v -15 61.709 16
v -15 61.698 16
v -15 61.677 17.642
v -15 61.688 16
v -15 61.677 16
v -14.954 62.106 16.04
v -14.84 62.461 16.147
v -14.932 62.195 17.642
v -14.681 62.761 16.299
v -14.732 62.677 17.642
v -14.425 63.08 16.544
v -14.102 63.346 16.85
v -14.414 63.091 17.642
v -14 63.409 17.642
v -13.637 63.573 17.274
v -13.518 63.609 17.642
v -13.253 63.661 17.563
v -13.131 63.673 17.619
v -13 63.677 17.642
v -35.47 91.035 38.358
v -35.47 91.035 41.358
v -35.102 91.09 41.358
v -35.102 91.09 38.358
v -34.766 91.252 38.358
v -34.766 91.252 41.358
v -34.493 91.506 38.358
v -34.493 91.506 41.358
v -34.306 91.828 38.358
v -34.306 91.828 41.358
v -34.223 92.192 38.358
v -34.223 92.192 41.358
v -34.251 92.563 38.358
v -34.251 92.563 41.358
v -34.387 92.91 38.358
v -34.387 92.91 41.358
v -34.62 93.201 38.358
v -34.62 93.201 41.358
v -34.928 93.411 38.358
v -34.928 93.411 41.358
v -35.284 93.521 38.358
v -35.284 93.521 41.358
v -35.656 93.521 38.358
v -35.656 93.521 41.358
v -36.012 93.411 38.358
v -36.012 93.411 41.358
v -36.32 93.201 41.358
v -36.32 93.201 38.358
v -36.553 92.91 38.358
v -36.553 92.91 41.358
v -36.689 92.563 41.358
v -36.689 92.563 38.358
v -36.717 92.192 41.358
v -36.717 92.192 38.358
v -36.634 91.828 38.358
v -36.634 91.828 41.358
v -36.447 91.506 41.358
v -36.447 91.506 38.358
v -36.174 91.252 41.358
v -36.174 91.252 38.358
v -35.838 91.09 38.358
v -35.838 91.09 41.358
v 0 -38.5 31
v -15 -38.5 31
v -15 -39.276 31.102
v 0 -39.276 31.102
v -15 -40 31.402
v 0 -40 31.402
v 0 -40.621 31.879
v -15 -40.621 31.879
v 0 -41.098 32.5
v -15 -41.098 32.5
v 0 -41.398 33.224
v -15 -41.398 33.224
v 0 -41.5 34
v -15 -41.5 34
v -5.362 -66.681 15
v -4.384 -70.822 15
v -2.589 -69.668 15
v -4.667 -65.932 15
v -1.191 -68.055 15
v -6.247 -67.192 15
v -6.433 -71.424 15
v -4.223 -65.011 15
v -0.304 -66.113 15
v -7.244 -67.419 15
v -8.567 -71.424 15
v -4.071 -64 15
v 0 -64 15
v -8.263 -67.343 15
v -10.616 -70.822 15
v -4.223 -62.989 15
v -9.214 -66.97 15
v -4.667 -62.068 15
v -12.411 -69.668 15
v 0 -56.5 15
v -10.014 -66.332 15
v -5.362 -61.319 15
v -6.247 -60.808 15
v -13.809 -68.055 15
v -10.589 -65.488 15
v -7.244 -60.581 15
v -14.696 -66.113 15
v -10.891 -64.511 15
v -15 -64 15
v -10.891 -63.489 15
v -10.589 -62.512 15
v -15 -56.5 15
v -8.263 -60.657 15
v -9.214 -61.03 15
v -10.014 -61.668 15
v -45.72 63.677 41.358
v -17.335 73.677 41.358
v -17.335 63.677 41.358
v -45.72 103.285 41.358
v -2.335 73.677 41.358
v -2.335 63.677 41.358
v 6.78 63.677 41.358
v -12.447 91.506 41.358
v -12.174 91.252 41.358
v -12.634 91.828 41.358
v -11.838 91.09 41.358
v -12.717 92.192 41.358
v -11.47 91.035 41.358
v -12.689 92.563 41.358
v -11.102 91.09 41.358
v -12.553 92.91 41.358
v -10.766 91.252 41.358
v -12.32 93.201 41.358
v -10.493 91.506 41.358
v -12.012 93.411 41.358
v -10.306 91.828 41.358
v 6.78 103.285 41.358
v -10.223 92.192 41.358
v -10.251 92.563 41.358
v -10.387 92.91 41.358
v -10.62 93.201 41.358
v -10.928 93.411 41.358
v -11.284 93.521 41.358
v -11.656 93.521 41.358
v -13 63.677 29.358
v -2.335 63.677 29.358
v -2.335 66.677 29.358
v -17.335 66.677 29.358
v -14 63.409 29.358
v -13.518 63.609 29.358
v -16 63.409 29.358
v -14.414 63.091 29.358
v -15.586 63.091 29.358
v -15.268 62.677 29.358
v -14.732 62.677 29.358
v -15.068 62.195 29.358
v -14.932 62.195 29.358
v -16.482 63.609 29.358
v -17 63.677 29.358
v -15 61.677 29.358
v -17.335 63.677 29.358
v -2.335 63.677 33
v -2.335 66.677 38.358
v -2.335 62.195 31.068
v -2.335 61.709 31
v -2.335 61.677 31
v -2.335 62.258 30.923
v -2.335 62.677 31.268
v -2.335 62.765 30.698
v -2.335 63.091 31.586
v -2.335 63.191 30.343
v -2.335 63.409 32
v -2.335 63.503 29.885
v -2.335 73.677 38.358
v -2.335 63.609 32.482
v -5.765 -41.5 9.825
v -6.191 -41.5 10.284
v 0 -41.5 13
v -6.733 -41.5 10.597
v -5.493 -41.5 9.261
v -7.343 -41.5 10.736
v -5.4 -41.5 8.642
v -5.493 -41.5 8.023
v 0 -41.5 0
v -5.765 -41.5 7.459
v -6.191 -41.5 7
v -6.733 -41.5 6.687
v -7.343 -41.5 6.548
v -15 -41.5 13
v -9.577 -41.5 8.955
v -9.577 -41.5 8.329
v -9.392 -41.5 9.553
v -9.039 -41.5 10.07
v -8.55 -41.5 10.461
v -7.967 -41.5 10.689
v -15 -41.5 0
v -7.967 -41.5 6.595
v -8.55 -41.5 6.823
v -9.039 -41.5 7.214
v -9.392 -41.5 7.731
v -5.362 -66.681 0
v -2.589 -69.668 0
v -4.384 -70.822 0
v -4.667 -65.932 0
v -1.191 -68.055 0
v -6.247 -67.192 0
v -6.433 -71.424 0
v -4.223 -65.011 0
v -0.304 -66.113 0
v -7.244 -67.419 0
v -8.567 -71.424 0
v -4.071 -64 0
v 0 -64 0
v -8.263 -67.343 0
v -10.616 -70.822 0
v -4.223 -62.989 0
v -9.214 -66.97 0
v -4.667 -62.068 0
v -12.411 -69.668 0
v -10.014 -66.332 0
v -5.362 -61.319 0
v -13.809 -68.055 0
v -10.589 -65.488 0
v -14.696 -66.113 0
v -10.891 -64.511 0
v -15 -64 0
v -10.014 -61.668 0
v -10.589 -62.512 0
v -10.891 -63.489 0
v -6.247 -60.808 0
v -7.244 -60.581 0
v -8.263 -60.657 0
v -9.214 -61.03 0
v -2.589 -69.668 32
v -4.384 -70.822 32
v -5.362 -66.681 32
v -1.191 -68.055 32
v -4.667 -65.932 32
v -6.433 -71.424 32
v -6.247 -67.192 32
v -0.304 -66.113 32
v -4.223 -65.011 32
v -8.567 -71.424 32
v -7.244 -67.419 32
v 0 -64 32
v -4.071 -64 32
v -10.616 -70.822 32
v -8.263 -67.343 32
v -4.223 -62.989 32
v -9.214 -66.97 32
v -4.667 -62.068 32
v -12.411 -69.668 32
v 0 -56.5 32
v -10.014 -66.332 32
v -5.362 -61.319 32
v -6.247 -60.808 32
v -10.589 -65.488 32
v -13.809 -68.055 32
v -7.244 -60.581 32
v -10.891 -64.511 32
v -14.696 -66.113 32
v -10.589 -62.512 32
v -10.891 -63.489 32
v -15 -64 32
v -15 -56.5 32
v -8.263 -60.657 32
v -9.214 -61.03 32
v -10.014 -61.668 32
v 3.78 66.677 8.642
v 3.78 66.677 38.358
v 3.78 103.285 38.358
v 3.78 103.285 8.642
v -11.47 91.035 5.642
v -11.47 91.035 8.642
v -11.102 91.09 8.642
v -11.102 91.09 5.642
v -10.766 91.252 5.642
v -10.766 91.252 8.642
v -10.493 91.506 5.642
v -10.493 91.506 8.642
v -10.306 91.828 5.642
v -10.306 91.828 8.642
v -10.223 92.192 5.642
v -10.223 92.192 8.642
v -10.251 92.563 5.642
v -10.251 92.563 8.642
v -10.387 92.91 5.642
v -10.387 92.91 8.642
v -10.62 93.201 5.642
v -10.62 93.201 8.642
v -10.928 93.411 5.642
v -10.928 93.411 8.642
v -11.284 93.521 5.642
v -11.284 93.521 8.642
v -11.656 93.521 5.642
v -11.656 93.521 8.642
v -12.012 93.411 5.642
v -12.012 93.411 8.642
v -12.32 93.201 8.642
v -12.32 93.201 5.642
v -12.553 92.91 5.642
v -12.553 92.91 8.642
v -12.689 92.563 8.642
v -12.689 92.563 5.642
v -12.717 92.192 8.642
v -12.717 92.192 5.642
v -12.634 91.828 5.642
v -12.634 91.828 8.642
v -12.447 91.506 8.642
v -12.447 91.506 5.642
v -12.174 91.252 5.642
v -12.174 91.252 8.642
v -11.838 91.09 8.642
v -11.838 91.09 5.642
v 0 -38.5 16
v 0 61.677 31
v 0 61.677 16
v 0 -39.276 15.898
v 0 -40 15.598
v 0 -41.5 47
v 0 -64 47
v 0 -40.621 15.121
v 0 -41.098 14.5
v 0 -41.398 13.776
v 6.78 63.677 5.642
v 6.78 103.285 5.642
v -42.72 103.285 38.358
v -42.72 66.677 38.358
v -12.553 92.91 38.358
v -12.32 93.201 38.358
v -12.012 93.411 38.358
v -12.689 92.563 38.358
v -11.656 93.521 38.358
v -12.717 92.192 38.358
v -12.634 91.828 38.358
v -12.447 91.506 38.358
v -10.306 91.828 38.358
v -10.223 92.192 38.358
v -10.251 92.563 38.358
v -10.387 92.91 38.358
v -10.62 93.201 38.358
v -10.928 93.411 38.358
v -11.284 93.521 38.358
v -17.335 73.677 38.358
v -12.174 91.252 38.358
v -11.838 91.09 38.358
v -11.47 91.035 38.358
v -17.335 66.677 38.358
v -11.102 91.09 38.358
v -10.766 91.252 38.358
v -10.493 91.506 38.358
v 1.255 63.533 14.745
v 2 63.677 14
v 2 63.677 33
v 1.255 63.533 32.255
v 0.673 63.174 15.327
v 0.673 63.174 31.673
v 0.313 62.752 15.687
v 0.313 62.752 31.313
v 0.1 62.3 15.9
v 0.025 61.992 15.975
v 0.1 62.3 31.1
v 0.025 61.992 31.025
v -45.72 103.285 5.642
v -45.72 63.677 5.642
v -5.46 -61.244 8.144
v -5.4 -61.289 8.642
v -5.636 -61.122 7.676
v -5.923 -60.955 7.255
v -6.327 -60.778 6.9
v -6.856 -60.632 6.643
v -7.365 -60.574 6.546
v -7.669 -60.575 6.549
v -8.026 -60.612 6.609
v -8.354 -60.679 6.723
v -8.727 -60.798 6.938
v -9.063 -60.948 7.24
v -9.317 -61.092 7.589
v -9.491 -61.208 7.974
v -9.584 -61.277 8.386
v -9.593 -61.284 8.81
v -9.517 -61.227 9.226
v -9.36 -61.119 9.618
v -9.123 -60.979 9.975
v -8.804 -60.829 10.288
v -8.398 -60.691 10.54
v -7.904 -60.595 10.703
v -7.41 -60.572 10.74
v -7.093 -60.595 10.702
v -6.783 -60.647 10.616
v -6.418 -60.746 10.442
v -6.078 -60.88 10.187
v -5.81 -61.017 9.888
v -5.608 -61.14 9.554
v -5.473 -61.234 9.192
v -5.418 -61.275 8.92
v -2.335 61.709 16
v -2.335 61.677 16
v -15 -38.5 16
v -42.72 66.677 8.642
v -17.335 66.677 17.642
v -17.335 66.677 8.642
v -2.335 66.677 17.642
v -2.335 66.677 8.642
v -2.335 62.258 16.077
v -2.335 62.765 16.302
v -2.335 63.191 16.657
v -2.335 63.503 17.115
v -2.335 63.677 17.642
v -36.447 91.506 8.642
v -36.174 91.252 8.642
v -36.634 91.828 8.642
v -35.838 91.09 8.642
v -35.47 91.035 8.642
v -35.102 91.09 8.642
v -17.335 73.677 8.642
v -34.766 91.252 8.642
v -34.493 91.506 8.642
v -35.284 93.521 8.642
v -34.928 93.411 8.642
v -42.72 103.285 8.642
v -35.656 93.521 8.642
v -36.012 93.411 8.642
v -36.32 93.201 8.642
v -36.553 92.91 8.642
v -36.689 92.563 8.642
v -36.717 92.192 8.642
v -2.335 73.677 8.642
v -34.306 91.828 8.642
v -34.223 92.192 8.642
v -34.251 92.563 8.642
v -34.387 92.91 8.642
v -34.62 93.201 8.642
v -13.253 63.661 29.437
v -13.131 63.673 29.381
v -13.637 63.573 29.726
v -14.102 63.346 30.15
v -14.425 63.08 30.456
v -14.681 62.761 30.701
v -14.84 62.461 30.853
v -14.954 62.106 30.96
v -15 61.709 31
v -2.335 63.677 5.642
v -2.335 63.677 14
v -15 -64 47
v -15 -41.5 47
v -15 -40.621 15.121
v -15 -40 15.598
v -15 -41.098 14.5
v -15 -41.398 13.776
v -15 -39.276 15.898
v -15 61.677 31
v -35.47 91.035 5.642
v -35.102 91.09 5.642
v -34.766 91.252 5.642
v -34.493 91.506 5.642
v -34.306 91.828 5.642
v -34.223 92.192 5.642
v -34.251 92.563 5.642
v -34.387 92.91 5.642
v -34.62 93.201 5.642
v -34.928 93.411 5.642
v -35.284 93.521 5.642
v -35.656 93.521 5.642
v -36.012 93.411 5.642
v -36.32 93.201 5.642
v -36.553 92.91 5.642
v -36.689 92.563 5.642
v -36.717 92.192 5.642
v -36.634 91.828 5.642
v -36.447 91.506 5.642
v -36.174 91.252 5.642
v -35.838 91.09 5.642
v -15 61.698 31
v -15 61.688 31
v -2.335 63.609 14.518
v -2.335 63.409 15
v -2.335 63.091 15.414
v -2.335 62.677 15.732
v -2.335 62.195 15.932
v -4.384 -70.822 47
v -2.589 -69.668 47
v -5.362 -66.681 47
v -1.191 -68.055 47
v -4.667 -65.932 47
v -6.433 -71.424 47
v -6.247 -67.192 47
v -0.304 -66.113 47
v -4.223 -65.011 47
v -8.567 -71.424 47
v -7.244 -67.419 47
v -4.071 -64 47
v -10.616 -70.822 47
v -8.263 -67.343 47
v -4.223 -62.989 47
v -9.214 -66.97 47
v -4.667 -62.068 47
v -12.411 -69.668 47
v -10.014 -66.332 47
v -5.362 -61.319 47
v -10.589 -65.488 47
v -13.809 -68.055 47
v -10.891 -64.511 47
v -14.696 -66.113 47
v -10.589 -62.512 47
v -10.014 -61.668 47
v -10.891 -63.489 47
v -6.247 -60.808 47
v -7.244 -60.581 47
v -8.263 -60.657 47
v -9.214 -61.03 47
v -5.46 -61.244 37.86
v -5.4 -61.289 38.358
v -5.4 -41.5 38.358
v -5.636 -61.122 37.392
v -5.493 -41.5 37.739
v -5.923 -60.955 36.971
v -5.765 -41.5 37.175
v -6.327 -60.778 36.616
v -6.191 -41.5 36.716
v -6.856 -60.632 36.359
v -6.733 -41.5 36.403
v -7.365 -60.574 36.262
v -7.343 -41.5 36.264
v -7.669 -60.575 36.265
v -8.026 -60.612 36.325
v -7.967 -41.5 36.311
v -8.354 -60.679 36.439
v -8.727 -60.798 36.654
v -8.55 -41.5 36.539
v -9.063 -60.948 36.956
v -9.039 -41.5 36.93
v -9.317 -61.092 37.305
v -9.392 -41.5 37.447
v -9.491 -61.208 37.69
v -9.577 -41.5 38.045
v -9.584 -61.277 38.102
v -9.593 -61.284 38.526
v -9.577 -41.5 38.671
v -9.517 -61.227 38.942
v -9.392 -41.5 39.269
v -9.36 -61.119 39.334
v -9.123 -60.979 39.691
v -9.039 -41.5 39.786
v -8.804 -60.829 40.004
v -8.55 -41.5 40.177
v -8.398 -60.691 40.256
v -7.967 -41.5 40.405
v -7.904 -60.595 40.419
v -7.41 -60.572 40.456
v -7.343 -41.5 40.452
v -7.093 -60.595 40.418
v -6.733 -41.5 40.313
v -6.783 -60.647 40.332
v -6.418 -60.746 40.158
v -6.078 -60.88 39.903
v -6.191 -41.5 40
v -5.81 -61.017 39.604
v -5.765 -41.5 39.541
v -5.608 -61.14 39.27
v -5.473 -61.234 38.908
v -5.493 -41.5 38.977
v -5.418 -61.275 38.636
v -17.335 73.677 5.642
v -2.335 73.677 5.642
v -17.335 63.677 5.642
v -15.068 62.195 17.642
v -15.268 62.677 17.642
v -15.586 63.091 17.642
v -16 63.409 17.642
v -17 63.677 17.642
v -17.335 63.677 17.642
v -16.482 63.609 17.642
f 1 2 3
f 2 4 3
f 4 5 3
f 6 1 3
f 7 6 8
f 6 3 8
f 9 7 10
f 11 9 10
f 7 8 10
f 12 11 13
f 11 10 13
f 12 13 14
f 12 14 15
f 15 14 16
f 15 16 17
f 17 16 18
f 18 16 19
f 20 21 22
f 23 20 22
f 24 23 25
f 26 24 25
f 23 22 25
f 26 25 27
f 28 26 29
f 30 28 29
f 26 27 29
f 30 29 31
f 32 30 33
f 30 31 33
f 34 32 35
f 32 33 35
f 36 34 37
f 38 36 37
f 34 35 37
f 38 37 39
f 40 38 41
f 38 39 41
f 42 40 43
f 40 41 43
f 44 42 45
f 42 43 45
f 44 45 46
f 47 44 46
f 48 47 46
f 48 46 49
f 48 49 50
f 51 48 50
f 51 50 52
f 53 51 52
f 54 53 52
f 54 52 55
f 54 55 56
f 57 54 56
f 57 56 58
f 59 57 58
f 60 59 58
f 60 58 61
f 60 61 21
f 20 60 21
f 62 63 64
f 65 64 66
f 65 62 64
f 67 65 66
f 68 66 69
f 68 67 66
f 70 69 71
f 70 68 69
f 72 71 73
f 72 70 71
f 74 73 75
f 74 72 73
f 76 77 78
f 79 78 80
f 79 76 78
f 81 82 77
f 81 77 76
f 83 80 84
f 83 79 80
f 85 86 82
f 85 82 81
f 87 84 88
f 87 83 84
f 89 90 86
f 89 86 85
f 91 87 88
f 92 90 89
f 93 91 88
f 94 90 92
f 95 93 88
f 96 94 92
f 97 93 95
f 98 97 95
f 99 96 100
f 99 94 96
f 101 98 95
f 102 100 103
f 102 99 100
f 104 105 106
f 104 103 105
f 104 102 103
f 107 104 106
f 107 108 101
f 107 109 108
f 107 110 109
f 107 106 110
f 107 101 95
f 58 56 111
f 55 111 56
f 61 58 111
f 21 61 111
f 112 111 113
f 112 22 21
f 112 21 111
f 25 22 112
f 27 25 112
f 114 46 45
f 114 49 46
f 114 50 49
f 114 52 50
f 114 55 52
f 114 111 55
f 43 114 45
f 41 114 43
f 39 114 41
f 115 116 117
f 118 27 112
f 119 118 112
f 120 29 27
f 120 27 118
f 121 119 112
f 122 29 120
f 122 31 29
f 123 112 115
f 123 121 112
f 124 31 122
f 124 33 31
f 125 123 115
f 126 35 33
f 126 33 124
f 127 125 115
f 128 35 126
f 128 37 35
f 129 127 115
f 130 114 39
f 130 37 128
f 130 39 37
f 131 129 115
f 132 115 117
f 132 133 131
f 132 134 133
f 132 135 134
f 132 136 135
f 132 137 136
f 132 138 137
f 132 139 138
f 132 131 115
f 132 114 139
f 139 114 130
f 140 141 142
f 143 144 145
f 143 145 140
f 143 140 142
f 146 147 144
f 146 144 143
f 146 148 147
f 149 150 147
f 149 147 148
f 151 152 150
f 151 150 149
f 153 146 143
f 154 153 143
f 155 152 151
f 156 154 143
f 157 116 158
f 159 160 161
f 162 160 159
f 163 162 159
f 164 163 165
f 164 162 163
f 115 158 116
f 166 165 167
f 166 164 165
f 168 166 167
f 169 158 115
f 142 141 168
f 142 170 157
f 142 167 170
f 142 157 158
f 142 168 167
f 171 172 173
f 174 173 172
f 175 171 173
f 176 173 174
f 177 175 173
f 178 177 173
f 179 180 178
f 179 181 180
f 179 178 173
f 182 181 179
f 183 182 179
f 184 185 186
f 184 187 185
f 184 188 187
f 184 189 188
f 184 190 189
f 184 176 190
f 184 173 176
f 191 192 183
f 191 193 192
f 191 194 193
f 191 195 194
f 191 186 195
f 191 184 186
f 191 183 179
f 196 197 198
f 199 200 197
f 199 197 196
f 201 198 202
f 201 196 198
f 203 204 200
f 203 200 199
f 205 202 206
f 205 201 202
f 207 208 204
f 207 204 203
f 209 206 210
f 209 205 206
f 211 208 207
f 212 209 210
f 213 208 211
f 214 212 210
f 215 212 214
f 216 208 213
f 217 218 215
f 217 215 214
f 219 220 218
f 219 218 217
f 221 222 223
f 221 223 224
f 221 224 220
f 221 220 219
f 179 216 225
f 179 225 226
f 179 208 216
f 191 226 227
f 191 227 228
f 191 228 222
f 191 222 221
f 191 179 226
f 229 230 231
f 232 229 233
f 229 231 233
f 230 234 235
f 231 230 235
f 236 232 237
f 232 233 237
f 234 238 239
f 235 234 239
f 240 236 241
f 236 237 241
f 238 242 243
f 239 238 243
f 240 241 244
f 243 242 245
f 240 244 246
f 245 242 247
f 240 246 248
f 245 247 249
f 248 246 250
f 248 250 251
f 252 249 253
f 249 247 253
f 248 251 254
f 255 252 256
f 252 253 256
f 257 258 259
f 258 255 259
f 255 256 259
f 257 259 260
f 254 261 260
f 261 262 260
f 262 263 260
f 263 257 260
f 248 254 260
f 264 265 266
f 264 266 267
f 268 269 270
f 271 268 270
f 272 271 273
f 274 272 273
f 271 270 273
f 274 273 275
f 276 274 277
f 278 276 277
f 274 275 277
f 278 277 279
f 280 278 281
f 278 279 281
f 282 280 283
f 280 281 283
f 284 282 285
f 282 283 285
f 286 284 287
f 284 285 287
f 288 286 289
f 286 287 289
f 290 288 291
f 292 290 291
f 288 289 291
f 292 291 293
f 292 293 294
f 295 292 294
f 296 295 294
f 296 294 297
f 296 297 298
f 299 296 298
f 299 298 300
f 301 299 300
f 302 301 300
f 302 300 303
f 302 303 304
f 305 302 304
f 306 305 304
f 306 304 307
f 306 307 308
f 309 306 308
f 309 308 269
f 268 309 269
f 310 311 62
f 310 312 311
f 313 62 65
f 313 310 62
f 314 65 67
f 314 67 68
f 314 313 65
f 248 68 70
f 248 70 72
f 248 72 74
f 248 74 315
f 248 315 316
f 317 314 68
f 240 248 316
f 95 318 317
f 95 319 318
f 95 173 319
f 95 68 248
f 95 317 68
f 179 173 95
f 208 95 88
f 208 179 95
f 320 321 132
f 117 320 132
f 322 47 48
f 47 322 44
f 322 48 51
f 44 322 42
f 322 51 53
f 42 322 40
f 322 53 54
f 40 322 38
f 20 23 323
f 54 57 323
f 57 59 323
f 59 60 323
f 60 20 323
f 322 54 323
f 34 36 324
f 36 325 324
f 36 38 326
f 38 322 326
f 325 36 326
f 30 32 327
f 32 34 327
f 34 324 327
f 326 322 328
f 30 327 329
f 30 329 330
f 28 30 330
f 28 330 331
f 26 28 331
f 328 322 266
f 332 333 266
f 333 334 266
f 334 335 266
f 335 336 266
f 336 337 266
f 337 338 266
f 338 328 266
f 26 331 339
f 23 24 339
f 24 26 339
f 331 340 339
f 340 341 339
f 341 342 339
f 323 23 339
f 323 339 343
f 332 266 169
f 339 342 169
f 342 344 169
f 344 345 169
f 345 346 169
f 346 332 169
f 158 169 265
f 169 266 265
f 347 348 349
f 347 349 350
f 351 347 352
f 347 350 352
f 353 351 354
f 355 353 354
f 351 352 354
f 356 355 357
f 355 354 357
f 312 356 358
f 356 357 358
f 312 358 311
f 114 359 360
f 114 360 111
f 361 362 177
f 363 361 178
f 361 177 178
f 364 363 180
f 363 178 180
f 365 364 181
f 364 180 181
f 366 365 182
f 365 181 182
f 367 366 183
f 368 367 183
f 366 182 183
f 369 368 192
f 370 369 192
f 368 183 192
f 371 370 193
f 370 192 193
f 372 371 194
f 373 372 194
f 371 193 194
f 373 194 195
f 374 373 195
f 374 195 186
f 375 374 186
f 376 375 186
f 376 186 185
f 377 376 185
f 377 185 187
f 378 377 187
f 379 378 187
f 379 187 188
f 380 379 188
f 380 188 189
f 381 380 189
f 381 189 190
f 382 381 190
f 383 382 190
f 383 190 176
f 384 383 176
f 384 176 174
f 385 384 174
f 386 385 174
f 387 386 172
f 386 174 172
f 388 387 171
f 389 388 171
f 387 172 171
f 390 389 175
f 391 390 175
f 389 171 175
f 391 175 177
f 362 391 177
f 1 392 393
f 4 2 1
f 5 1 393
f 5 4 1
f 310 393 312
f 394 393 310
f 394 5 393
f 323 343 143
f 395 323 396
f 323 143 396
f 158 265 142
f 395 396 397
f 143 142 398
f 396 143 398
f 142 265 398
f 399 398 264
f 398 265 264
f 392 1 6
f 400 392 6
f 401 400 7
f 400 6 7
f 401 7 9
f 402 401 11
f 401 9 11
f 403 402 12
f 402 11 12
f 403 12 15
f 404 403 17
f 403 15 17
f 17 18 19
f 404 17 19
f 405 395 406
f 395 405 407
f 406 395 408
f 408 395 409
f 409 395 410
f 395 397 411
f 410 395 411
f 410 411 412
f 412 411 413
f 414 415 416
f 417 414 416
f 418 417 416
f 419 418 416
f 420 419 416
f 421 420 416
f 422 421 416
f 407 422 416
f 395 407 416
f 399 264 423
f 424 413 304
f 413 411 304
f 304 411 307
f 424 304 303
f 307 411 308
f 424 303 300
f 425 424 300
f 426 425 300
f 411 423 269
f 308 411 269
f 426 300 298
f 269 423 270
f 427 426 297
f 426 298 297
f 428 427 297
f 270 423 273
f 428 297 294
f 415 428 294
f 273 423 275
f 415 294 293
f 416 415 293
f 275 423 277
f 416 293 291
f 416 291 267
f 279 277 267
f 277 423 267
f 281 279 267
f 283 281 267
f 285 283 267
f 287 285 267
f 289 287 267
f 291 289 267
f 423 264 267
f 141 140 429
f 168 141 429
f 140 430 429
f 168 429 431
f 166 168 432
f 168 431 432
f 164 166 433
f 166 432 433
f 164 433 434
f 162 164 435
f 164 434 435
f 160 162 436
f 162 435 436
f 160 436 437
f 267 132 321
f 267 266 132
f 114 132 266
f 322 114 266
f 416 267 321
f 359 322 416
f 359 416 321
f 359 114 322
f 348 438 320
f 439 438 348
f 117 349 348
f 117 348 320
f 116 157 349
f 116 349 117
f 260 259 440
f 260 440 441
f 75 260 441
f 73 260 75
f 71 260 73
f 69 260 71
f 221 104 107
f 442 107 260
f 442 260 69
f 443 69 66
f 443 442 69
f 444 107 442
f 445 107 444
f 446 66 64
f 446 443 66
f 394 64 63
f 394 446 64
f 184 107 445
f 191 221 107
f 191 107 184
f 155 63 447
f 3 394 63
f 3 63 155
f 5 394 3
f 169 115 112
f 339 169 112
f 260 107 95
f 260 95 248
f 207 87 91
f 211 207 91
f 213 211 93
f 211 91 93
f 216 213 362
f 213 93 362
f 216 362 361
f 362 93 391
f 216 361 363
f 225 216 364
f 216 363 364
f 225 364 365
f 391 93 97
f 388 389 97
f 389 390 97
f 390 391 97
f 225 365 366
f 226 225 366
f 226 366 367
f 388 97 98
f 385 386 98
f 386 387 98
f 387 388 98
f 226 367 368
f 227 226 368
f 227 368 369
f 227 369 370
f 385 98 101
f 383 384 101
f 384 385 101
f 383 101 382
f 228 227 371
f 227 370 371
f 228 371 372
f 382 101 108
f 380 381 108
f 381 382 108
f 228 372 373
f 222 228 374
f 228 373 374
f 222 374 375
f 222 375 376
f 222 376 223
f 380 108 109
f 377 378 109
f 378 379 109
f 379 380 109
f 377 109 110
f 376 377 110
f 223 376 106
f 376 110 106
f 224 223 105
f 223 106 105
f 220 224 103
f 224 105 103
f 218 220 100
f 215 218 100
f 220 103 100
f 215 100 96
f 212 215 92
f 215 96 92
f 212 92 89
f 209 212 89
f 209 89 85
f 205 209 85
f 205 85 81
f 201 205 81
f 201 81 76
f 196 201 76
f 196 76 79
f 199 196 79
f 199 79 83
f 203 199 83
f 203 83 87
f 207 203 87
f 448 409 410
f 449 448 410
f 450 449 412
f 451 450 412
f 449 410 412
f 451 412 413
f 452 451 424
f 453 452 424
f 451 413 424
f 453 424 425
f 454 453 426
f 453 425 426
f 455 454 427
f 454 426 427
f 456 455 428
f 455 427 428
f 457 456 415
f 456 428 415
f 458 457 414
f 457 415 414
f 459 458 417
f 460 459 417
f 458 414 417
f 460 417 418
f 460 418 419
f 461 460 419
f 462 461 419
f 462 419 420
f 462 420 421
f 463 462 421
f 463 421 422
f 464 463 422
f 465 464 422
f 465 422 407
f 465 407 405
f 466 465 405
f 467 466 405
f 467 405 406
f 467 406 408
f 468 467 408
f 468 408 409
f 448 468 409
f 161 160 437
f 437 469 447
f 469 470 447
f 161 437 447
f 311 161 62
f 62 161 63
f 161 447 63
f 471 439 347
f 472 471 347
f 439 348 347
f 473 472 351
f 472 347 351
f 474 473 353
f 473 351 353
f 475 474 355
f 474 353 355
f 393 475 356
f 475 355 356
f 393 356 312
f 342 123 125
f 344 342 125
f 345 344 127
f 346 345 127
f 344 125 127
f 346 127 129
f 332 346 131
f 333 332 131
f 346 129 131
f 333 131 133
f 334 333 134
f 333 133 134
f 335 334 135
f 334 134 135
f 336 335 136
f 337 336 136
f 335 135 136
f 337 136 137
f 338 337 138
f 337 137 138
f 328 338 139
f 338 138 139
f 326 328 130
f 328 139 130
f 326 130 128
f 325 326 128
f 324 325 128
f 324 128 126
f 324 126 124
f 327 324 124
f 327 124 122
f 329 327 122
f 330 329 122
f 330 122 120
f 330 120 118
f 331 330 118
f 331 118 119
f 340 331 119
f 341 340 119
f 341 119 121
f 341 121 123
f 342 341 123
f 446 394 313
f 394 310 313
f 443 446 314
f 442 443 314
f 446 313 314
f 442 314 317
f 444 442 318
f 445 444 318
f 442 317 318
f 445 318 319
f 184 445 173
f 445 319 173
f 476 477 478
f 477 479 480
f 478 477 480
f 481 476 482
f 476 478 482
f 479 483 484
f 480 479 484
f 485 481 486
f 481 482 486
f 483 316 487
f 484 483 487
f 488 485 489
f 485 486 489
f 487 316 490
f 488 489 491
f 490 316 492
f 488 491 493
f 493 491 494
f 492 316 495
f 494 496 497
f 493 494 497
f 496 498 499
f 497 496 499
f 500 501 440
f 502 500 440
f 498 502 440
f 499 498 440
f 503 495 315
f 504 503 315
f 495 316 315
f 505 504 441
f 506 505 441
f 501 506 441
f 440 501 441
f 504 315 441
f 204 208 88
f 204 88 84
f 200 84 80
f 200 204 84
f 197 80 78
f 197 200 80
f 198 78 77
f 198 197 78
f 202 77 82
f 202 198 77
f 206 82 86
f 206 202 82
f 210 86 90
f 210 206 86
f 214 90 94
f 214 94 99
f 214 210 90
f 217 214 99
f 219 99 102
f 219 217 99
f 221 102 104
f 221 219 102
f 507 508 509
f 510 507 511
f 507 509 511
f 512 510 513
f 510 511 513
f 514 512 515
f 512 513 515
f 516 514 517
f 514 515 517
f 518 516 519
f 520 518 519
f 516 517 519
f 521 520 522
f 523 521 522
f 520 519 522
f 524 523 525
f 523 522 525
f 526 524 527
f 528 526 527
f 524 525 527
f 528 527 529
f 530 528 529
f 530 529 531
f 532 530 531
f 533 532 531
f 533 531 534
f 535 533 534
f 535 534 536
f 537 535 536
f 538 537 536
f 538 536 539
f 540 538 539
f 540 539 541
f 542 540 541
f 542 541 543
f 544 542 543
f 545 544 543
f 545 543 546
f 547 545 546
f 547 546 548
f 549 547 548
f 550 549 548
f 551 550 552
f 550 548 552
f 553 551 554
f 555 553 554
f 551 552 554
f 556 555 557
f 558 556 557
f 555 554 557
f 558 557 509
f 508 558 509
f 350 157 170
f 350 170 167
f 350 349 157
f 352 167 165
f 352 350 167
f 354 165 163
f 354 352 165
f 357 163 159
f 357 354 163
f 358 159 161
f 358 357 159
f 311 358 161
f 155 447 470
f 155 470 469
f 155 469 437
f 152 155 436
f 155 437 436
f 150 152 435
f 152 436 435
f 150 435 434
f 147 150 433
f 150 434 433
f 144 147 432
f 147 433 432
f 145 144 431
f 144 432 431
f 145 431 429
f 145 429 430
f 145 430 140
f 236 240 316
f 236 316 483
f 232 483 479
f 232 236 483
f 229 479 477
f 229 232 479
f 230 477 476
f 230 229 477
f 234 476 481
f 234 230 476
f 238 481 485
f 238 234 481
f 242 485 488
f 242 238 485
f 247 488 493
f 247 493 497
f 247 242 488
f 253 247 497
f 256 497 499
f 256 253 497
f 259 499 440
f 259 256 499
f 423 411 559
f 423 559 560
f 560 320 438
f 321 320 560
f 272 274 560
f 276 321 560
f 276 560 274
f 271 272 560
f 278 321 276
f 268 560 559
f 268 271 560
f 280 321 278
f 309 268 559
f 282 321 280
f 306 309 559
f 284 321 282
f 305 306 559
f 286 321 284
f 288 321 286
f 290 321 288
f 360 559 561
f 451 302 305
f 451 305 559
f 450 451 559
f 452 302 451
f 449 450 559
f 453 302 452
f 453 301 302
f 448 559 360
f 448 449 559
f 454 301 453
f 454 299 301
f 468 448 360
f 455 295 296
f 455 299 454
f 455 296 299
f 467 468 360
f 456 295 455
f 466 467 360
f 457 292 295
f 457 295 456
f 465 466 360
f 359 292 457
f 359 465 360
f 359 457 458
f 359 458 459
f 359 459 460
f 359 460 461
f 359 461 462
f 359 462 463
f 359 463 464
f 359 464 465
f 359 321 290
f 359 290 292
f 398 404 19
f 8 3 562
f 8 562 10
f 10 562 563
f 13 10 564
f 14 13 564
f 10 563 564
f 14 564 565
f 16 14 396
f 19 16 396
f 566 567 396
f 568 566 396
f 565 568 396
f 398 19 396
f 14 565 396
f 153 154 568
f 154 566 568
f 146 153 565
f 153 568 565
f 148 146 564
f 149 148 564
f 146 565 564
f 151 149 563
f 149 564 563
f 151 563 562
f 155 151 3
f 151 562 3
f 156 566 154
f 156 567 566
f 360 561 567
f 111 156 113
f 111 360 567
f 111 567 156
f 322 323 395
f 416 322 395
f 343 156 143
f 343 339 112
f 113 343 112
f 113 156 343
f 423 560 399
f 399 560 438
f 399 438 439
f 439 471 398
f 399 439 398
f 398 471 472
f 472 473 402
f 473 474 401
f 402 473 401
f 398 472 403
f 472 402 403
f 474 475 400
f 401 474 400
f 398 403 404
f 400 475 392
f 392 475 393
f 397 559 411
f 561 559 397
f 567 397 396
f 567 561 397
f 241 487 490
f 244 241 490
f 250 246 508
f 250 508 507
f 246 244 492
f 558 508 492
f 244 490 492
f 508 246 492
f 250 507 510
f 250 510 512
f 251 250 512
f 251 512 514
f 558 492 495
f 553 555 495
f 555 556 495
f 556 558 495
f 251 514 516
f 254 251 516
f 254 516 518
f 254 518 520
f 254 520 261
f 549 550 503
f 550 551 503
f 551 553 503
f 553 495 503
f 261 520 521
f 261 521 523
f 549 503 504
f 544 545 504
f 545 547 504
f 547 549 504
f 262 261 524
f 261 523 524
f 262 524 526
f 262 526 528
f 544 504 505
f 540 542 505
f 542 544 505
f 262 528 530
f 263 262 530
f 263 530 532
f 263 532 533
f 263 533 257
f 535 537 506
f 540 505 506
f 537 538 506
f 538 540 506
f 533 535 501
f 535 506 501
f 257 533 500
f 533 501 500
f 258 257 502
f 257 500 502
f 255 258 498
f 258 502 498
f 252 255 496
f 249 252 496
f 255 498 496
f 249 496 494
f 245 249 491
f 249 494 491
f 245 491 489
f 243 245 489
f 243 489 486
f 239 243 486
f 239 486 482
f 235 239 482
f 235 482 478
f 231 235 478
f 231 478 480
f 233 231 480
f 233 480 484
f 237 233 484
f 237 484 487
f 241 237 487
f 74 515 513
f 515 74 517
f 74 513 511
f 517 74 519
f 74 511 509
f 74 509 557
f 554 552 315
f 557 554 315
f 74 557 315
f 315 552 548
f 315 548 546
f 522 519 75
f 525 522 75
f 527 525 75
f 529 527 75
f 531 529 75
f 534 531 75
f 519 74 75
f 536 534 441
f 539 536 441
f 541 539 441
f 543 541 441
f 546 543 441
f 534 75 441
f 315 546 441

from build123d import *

# Parameters (mm, degrees)
BOSS_EXTRU_1_DEPTH                            = 47
ESQUISSE2_W                                   = 17
ESQUISSE2_H                                   = 14.999999999999986
ENL_V_MAT_EXTRU_1_DEPTH                       = 87.8691544795966
BOSS_EXTRU_2_DEPTH                            = 27.72
BOSS_EXTRU_2_DEPTH_BACK                       = 18.78
BOSS_EXTRU_5_REACH                            = 154.075
BOSS_EXTRU_5_DIRECTION_2_REACH                = 154.075
ESQUISSE5_R                                   = 1.2499999999999978
ENL_V_MAT_EXTRU_2_DEPTH                       = 121.28542019885793
ESQUISSE6_W                                   = 15.000000000000004
ESQUISSE6_H                                   = 11.999999999999996
ENL_V_MAT_EXTRU_3_DEPTH                       = 10
CONG_1_R                                      = 2
CONG_2_R                                      = 3
ESQUISSE9_R                                   = 3.4290000000000016
ENL_V_MAT_EXTRU_4_DEPTH                       = 123.34009215468092
TROU_POUR_TARAUDAGE_POUR_TROU_TARAUD_M5_REACH = 160.94
TROU_POUR_TARAUDAGE_POUR_TROU_TARAUD_2_R      = 2.1
CONG_3_R                                      = 2


with BuildPart() as part:
    # Esquisse1 → Boss.-Extru.1 (new body)
    with BuildSketch(Plane.XY):
        with BuildLine():
            Line((-15, 63.999998751364224), (0, 63.999998751364224))
            Line((0, 63.999998751364224), (-4.3e-16, -63.999998751364224))
            ThreePointArc((-4.3e-16, -63.999998751364224), (-7.499998751364213, -71.5), (-14.999999999999986, -64.00000124863578))
            Line((-14.999999999999986, -64.00000124863578), (-15, 63.999998751364224))
        make_face()
    extrude(amount=BOSS_EXTRU_1_DEPTH)

    # Esquisse2 → Enlèv. mat.-Extru.1 (cut, through all)
    with BuildSketch(Plane.ZY.offset(14.999999999999993)):
        with Locations((23.5, -64.00000000000009)):
            Rectangle(ESQUISSE2_W, ESQUISSE2_H)
        Polygon((47, 63.999998751364224), (31, 63.999998751364224), (31, -41.50000000000009), (47.000000000000014, -41.50000000000009), align=None)
        Polygon((0, 63.999998751364224), (16, 63.999998751364224), (16, -41.5000000000001), (1.292e-14, -41.5000000000001), align=None)
    extrude(amount=-ENL_V_MAT_EXTRU_1_DEPTH, mode=Mode.SUBTRACT)

    # Esquisse3 → Boss.-Extru.2 (add, two sides: drawn at the far end of the back side and taken through both)
    with BuildSketch(Plane.ZY.offset(14.999999999999993).offset(-BOSS_EXTRU_2_DEPTH_BACK)):
        Polygon((38.358000000000004, 103.28494444213939), (38.35800000000001, 66.67694444213939), (8.642, 66.67694444213939), (8.642, 103.28494444213939), (5.641999999999999, 103.28494444213939), (5.642000000000004, 63.676944442139366), (41.35800000000001, 63.676944442139366), (41.358000000000004, 103.28494444213939), align=None)
    extrude(amount=BOSS_EXTRU_2_DEPTH + BOSS_EXTRU_2_DEPTH_BACK)

    # Boss.-Extru.5: up to this face of the body (flat: up to its plane)
    boss_extru_5_end = Plane(part.part.faces().sort_by_distance((-19.47, 103.284944442, 7.142))[0])
    # Esquisse4 → Boss.-Extru.5 (add, up to the picked face)
    with BuildSketch(Plane(origin=(-7.29e-15, 66.67694444213939, 0), x_dir=(1, 1.1e-16, 0), z_dir=(-1.1e-16, 1, 0)), mode=Mode.PRIVATE) as boss_extru_5_sk1:
        Polygon((3.780000000000016, -5.641999999999999), (6.780000000000015, -5.641999999999999), (6.780000000000019, -41.358000000000004), (3.780000000000016, -41.358000000000004), align=None)
    boss_extru_5_tool1 = split(extrude(boss_extru_5_sk1.sketch, amount=BOSS_EXTRU_5_REACH, mode=Mode.PRIVATE), bisect_by=boss_extru_5_end, keep=Keep.BOTH, mode=Mode.PRIVATE)
    # Esquisse4 → Boss.-Extru.5 (add, up to the picked face)
    with BuildSketch(Plane(origin=(-7.29e-15, 66.67694444213939, 0), x_dir=(1, 1.1e-16, 0), z_dir=(-1.1e-16, 1, 0)), mode=Mode.PRIVATE) as boss_extru_5_sk2:
        Polygon((-42.719999999999985, -5.641999999999999), (-45.71999999999999, -5.641999999999999), (-45.719999999999985, -41.358000000000004), (-42.719999999999985, -41.358000000000004), align=None)
    boss_extru_5_tool2 = split(extrude(boss_extru_5_sk2.sketch, amount=BOSS_EXTRU_5_REACH, mode=Mode.PRIVATE), bisect_by=boss_extru_5_end, keep=Keep.BOTH, mode=Mode.PRIVATE)
    add(boss_extru_5_tool1.solids().sort_by(Axis((5.28, 66.676944, 23.5), (-1.1e-16, 1, 0)))[0])
    add(boss_extru_5_tool2.solids().sort_by(Axis((-44.22, 66.676944, 23.5), (-1.1e-16, 1, 0)))[0])

    # Boss.-Extru.5 direction 2: up to this face of the body (flat: up to its plane)
    boss_extru_5_direction_2_end = Plane(part.part.faces().sort_by_distance((-21.345791374, 63.676944442, 23.5))[0])
    # Esquisse4 → Boss.-Extru.5 direction 2 (add, up to the picked face)
    with BuildSketch(Plane(origin=(-7.29e-15, 66.67694444213939, 0), x_dir=(1, 1.1e-16, 0), z_dir=(-1.1e-16, 1, 0)), mode=Mode.PRIVATE) as boss_extru_5_direction_2_sk1:
        Polygon((3.780000000000016, -5.641999999999999), (6.780000000000015, -5.641999999999999), (6.780000000000019, -41.358000000000004), (3.780000000000016, -41.358000000000004), align=None)
    boss_extru_5_direction_2_tool1 = split(extrude(boss_extru_5_direction_2_sk1.sketch, amount=-BOSS_EXTRU_5_DIRECTION_2_REACH, mode=Mode.PRIVATE), bisect_by=boss_extru_5_direction_2_end, keep=Keep.BOTH, mode=Mode.PRIVATE)
    # Esquisse4 → Boss.-Extru.5 direction 2 (add, up to the picked face)
    with BuildSketch(Plane(origin=(-7.29e-15, 66.67694444213939, 0), x_dir=(1, 1.1e-16, 0), z_dir=(-1.1e-16, 1, 0)), mode=Mode.PRIVATE) as boss_extru_5_direction_2_sk2:
        Polygon((-42.719999999999985, -5.641999999999999), (-45.71999999999999, -5.641999999999999), (-45.719999999999985, -41.358000000000004), (-42.719999999999985, -41.358000000000004), align=None)
    boss_extru_5_direction_2_tool2 = split(extrude(boss_extru_5_direction_2_sk2.sketch, amount=-BOSS_EXTRU_5_DIRECTION_2_REACH, mode=Mode.PRIVATE), bisect_by=boss_extru_5_direction_2_end, keep=Keep.BOTH, mode=Mode.PRIVATE)
    add(boss_extru_5_direction_2_tool1.solids().sort_by(Axis((5.28, 66.676944, 23.5), (1.1e-16, -1, 0)))[0])
    add(boss_extru_5_direction_2_tool2.solids().sort_by(Axis((-44.22, 66.676944, 23.5), (1.1e-16, -1, 0)))[0])

    # Esquisse5 → Enlèv. mat.-Extru.2 (cut, through all)
    with BuildSketch(Plane.XY.offset(41.358000000000025)):
        with Locations(Location((-11.469999999999994, 92.28494444213936, 0), (0, 0, 270))):
            Circle(ESQUISSE5_R)
        with Locations(Location((-35.47, 92.28494444213936, 0), (0, 0, 270))):
            Circle(ESQUISSE5_R)
    extrude(amount=-ENL_V_MAT_EXTRU_2_DEPTH, mode=Mode.SUBTRACT)

    # Esquisse6 → Enlèv. mat.-Extru.3 (cut)
    with BuildSketch(Plane.XZ.offset(-63.676944442139366)):
        Polygon((-17.335036050217354, 41.35800000000002), (-2.335036050217353, 41.35800000000002), (-2.3350360502173517, 29.35800000000002), (-17.335036050217354, 29.35800000000002), align=None)
        with Locations((-9.835036050217353, 11.642000000000012)):
            Rectangle(ESQUISSE6_W, ESQUISSE6_H)
    extrude(amount=-ENL_V_MAT_EXTRU_3_DEPTH, mode=Mode.SUBTRACT)

    # Congé1
    cong_1_edges = [part.edges().sort_by_distance(p)[0] for p in [
        (-15, 63.67694444213936, 23.500000000000014),
        (-1.167518025108679, 63.676944442139366, 31),
        (0, 63.676944442139366, 23.5),
        (-1.167518025108679, 63.676944442139366, 16),
    ]]
    fillet(cong_1_edges, radius=CONG_1_R)

    # Congé2
    cong_2_edges = [part.edges().sort_by_distance(p)[0] for p in [
        (-7.499999999999994, -41.50000000000009, 31),
        (-7.499999999999994, -41.5000000000001, 16),
    ]]
    fillet(cong_2_edges, radius=CONG_2_R)

    # Esquisse9 → Enlèv. mat.-Extru.4 (cut, through all)
    with BuildSketch(Plane.XY.offset(47)):
        with Locations((-7.499999999999992, -64)):
            Circle(ESQUISSE9_R)
    extrude(amount=-ENL_V_MAT_EXTRU_4_DEPTH, mode=Mode.SUBTRACT)

    # Trou pour taraudage pour trou taraud 2 → Trou pour taraudage pour trou taraudé M52 (cut, up to next)
    with BuildSketch(Plane(origin=(4.53e-15, -41.5000000000001, 0), x_dir=(1, 1.1e-16, 0), z_dir=(-1.1e-16, 1, 0)), mode=Mode.PRIVATE) as trou_pour_taraudage_pour_trou_taraud_m5_sk1:
        with Locations((-7.5, -8.642)):
            Circle(TROU_POUR_TARAUDAGE_POUR_TROU_TARAUD_2_R)
    trou_pour_taraudage_pour_trou_taraud_m5_tool1 = extrude(trou_pour_taraudage_pour_trou_taraud_m5_sk1.sketch, amount=-TROU_POUR_TARAUDAGE_POUR_TROU_TARAUD_M5_REACH, mode=Mode.PRIVATE) & part.part
    # Trou pour taraudage pour trou taraud 2 → Trou pour taraudage pour trou taraudé M52 (cut, up to next)
    with BuildSketch(Plane(origin=(4.53e-15, -41.5000000000001, 0), x_dir=(1, 1.1e-16, 0), z_dir=(-1.1e-16, 1, 0)), mode=Mode.PRIVATE) as trou_pour_taraudage_pour_trou_taraud_m5_sk2:
        with Locations((-7.5, -38.358)):
            Circle(TROU_POUR_TARAUDAGE_POUR_TROU_TARAUD_2_R)
    trou_pour_taraudage_pour_trou_taraud_m5_tool2 = extrude(trou_pour_taraudage_pour_trou_taraud_m5_sk2.sketch, amount=-TROU_POUR_TARAUDAGE_POUR_TROU_TARAUD_M5_REACH, mode=Mode.PRIVATE) & part.part
    add(trou_pour_taraudage_pour_trou_taraud_m5_tool1.solids().sort_by_distance((-7.5, -41.5, 8.642))[0], mode=Mode.SUBTRACT)
    add(trou_pour_taraudage_pour_trou_taraud_m5_tool2.solids().sort_by_distance((-7.5, -41.5, 38.358))[0], mode=Mode.SUBTRACT)

    # Congé3
    # the kernel refuses this fillet: 2 mm, written as the material it takes off along each edge
    with BuildSketch(Plane(origin=(-19.919245368957963, 63.676944442139366, 16), x_dir=(1.1e-16, -1, 0), z_dir=(1, 1.1e-16, 0))) as cong_3_piece_1:
        with BuildLine():
            CenterArc((1.9676981475831852, -2), CONG_3_R, 90, 79.68848194075031)
            Line((5.6133e-13, -1.6420000000001131), (0, 0))
            Line((0, 0), (1.9676981475831852, 0))
        make_face()
    extrude(amount=17.584209318740605, mode=Mode.SUBTRACT)
    with BuildSketch(Plane(origin=(-15, 63.67694444213936, 17.64200000000001), x_dir=(0, -1, 0), z_dir=(0, 0, -1))) as cong_3_piece_2:
        with BuildLine():
            CenterArc((CONG_3_R, -CONG_3_R), CONG_3_R, 90, 90)
            Line((0, -CONG_3_R), (0, 0))
            Line((0, 0), (CONG_3_R, 0))
        make_face()
    extrude(amount=6.64200000000001, mode=Mode.SUBTRACT)
    with BuildSketch(Plane(origin=(-19.919245368957963, 63.676944442139366, 31), x_dir=(1.1e-16, -1, 0), z_dir=(1, 1.1e-16, 0))) as cong_3_piece_3:
        with BuildLine():
            CenterArc((1.967698147583178, 2), CONG_3_R, 190.31151805925052, 79.68848194074951)
            Line((5.6133e-13, 1.6420000000000847), (0, 0))
            Line((0, 0), (1.967698147583178, 0))
        make_face()
    extrude(amount=17.584209318740605, mode=Mode.SUBTRACT)
    with BuildSketch(Plane(origin=(-15, 63.67694444213936, 36.00000000000001), x_dir=(0, -1, 0), z_dir=(0, 0, -1))) as cong_3_piece_4:
        with BuildLine():
            CenterArc((CONG_3_R, -CONG_3_R), CONG_3_R, 90, 90)
            Line((0, -CONG_3_R), (0, 0))
            Line((0, 0), (CONG_3_R, 0))
        make_face()
    extrude(amount=6.641999999999989, mode=Mode.SUBTRACT)


solid = part.part
